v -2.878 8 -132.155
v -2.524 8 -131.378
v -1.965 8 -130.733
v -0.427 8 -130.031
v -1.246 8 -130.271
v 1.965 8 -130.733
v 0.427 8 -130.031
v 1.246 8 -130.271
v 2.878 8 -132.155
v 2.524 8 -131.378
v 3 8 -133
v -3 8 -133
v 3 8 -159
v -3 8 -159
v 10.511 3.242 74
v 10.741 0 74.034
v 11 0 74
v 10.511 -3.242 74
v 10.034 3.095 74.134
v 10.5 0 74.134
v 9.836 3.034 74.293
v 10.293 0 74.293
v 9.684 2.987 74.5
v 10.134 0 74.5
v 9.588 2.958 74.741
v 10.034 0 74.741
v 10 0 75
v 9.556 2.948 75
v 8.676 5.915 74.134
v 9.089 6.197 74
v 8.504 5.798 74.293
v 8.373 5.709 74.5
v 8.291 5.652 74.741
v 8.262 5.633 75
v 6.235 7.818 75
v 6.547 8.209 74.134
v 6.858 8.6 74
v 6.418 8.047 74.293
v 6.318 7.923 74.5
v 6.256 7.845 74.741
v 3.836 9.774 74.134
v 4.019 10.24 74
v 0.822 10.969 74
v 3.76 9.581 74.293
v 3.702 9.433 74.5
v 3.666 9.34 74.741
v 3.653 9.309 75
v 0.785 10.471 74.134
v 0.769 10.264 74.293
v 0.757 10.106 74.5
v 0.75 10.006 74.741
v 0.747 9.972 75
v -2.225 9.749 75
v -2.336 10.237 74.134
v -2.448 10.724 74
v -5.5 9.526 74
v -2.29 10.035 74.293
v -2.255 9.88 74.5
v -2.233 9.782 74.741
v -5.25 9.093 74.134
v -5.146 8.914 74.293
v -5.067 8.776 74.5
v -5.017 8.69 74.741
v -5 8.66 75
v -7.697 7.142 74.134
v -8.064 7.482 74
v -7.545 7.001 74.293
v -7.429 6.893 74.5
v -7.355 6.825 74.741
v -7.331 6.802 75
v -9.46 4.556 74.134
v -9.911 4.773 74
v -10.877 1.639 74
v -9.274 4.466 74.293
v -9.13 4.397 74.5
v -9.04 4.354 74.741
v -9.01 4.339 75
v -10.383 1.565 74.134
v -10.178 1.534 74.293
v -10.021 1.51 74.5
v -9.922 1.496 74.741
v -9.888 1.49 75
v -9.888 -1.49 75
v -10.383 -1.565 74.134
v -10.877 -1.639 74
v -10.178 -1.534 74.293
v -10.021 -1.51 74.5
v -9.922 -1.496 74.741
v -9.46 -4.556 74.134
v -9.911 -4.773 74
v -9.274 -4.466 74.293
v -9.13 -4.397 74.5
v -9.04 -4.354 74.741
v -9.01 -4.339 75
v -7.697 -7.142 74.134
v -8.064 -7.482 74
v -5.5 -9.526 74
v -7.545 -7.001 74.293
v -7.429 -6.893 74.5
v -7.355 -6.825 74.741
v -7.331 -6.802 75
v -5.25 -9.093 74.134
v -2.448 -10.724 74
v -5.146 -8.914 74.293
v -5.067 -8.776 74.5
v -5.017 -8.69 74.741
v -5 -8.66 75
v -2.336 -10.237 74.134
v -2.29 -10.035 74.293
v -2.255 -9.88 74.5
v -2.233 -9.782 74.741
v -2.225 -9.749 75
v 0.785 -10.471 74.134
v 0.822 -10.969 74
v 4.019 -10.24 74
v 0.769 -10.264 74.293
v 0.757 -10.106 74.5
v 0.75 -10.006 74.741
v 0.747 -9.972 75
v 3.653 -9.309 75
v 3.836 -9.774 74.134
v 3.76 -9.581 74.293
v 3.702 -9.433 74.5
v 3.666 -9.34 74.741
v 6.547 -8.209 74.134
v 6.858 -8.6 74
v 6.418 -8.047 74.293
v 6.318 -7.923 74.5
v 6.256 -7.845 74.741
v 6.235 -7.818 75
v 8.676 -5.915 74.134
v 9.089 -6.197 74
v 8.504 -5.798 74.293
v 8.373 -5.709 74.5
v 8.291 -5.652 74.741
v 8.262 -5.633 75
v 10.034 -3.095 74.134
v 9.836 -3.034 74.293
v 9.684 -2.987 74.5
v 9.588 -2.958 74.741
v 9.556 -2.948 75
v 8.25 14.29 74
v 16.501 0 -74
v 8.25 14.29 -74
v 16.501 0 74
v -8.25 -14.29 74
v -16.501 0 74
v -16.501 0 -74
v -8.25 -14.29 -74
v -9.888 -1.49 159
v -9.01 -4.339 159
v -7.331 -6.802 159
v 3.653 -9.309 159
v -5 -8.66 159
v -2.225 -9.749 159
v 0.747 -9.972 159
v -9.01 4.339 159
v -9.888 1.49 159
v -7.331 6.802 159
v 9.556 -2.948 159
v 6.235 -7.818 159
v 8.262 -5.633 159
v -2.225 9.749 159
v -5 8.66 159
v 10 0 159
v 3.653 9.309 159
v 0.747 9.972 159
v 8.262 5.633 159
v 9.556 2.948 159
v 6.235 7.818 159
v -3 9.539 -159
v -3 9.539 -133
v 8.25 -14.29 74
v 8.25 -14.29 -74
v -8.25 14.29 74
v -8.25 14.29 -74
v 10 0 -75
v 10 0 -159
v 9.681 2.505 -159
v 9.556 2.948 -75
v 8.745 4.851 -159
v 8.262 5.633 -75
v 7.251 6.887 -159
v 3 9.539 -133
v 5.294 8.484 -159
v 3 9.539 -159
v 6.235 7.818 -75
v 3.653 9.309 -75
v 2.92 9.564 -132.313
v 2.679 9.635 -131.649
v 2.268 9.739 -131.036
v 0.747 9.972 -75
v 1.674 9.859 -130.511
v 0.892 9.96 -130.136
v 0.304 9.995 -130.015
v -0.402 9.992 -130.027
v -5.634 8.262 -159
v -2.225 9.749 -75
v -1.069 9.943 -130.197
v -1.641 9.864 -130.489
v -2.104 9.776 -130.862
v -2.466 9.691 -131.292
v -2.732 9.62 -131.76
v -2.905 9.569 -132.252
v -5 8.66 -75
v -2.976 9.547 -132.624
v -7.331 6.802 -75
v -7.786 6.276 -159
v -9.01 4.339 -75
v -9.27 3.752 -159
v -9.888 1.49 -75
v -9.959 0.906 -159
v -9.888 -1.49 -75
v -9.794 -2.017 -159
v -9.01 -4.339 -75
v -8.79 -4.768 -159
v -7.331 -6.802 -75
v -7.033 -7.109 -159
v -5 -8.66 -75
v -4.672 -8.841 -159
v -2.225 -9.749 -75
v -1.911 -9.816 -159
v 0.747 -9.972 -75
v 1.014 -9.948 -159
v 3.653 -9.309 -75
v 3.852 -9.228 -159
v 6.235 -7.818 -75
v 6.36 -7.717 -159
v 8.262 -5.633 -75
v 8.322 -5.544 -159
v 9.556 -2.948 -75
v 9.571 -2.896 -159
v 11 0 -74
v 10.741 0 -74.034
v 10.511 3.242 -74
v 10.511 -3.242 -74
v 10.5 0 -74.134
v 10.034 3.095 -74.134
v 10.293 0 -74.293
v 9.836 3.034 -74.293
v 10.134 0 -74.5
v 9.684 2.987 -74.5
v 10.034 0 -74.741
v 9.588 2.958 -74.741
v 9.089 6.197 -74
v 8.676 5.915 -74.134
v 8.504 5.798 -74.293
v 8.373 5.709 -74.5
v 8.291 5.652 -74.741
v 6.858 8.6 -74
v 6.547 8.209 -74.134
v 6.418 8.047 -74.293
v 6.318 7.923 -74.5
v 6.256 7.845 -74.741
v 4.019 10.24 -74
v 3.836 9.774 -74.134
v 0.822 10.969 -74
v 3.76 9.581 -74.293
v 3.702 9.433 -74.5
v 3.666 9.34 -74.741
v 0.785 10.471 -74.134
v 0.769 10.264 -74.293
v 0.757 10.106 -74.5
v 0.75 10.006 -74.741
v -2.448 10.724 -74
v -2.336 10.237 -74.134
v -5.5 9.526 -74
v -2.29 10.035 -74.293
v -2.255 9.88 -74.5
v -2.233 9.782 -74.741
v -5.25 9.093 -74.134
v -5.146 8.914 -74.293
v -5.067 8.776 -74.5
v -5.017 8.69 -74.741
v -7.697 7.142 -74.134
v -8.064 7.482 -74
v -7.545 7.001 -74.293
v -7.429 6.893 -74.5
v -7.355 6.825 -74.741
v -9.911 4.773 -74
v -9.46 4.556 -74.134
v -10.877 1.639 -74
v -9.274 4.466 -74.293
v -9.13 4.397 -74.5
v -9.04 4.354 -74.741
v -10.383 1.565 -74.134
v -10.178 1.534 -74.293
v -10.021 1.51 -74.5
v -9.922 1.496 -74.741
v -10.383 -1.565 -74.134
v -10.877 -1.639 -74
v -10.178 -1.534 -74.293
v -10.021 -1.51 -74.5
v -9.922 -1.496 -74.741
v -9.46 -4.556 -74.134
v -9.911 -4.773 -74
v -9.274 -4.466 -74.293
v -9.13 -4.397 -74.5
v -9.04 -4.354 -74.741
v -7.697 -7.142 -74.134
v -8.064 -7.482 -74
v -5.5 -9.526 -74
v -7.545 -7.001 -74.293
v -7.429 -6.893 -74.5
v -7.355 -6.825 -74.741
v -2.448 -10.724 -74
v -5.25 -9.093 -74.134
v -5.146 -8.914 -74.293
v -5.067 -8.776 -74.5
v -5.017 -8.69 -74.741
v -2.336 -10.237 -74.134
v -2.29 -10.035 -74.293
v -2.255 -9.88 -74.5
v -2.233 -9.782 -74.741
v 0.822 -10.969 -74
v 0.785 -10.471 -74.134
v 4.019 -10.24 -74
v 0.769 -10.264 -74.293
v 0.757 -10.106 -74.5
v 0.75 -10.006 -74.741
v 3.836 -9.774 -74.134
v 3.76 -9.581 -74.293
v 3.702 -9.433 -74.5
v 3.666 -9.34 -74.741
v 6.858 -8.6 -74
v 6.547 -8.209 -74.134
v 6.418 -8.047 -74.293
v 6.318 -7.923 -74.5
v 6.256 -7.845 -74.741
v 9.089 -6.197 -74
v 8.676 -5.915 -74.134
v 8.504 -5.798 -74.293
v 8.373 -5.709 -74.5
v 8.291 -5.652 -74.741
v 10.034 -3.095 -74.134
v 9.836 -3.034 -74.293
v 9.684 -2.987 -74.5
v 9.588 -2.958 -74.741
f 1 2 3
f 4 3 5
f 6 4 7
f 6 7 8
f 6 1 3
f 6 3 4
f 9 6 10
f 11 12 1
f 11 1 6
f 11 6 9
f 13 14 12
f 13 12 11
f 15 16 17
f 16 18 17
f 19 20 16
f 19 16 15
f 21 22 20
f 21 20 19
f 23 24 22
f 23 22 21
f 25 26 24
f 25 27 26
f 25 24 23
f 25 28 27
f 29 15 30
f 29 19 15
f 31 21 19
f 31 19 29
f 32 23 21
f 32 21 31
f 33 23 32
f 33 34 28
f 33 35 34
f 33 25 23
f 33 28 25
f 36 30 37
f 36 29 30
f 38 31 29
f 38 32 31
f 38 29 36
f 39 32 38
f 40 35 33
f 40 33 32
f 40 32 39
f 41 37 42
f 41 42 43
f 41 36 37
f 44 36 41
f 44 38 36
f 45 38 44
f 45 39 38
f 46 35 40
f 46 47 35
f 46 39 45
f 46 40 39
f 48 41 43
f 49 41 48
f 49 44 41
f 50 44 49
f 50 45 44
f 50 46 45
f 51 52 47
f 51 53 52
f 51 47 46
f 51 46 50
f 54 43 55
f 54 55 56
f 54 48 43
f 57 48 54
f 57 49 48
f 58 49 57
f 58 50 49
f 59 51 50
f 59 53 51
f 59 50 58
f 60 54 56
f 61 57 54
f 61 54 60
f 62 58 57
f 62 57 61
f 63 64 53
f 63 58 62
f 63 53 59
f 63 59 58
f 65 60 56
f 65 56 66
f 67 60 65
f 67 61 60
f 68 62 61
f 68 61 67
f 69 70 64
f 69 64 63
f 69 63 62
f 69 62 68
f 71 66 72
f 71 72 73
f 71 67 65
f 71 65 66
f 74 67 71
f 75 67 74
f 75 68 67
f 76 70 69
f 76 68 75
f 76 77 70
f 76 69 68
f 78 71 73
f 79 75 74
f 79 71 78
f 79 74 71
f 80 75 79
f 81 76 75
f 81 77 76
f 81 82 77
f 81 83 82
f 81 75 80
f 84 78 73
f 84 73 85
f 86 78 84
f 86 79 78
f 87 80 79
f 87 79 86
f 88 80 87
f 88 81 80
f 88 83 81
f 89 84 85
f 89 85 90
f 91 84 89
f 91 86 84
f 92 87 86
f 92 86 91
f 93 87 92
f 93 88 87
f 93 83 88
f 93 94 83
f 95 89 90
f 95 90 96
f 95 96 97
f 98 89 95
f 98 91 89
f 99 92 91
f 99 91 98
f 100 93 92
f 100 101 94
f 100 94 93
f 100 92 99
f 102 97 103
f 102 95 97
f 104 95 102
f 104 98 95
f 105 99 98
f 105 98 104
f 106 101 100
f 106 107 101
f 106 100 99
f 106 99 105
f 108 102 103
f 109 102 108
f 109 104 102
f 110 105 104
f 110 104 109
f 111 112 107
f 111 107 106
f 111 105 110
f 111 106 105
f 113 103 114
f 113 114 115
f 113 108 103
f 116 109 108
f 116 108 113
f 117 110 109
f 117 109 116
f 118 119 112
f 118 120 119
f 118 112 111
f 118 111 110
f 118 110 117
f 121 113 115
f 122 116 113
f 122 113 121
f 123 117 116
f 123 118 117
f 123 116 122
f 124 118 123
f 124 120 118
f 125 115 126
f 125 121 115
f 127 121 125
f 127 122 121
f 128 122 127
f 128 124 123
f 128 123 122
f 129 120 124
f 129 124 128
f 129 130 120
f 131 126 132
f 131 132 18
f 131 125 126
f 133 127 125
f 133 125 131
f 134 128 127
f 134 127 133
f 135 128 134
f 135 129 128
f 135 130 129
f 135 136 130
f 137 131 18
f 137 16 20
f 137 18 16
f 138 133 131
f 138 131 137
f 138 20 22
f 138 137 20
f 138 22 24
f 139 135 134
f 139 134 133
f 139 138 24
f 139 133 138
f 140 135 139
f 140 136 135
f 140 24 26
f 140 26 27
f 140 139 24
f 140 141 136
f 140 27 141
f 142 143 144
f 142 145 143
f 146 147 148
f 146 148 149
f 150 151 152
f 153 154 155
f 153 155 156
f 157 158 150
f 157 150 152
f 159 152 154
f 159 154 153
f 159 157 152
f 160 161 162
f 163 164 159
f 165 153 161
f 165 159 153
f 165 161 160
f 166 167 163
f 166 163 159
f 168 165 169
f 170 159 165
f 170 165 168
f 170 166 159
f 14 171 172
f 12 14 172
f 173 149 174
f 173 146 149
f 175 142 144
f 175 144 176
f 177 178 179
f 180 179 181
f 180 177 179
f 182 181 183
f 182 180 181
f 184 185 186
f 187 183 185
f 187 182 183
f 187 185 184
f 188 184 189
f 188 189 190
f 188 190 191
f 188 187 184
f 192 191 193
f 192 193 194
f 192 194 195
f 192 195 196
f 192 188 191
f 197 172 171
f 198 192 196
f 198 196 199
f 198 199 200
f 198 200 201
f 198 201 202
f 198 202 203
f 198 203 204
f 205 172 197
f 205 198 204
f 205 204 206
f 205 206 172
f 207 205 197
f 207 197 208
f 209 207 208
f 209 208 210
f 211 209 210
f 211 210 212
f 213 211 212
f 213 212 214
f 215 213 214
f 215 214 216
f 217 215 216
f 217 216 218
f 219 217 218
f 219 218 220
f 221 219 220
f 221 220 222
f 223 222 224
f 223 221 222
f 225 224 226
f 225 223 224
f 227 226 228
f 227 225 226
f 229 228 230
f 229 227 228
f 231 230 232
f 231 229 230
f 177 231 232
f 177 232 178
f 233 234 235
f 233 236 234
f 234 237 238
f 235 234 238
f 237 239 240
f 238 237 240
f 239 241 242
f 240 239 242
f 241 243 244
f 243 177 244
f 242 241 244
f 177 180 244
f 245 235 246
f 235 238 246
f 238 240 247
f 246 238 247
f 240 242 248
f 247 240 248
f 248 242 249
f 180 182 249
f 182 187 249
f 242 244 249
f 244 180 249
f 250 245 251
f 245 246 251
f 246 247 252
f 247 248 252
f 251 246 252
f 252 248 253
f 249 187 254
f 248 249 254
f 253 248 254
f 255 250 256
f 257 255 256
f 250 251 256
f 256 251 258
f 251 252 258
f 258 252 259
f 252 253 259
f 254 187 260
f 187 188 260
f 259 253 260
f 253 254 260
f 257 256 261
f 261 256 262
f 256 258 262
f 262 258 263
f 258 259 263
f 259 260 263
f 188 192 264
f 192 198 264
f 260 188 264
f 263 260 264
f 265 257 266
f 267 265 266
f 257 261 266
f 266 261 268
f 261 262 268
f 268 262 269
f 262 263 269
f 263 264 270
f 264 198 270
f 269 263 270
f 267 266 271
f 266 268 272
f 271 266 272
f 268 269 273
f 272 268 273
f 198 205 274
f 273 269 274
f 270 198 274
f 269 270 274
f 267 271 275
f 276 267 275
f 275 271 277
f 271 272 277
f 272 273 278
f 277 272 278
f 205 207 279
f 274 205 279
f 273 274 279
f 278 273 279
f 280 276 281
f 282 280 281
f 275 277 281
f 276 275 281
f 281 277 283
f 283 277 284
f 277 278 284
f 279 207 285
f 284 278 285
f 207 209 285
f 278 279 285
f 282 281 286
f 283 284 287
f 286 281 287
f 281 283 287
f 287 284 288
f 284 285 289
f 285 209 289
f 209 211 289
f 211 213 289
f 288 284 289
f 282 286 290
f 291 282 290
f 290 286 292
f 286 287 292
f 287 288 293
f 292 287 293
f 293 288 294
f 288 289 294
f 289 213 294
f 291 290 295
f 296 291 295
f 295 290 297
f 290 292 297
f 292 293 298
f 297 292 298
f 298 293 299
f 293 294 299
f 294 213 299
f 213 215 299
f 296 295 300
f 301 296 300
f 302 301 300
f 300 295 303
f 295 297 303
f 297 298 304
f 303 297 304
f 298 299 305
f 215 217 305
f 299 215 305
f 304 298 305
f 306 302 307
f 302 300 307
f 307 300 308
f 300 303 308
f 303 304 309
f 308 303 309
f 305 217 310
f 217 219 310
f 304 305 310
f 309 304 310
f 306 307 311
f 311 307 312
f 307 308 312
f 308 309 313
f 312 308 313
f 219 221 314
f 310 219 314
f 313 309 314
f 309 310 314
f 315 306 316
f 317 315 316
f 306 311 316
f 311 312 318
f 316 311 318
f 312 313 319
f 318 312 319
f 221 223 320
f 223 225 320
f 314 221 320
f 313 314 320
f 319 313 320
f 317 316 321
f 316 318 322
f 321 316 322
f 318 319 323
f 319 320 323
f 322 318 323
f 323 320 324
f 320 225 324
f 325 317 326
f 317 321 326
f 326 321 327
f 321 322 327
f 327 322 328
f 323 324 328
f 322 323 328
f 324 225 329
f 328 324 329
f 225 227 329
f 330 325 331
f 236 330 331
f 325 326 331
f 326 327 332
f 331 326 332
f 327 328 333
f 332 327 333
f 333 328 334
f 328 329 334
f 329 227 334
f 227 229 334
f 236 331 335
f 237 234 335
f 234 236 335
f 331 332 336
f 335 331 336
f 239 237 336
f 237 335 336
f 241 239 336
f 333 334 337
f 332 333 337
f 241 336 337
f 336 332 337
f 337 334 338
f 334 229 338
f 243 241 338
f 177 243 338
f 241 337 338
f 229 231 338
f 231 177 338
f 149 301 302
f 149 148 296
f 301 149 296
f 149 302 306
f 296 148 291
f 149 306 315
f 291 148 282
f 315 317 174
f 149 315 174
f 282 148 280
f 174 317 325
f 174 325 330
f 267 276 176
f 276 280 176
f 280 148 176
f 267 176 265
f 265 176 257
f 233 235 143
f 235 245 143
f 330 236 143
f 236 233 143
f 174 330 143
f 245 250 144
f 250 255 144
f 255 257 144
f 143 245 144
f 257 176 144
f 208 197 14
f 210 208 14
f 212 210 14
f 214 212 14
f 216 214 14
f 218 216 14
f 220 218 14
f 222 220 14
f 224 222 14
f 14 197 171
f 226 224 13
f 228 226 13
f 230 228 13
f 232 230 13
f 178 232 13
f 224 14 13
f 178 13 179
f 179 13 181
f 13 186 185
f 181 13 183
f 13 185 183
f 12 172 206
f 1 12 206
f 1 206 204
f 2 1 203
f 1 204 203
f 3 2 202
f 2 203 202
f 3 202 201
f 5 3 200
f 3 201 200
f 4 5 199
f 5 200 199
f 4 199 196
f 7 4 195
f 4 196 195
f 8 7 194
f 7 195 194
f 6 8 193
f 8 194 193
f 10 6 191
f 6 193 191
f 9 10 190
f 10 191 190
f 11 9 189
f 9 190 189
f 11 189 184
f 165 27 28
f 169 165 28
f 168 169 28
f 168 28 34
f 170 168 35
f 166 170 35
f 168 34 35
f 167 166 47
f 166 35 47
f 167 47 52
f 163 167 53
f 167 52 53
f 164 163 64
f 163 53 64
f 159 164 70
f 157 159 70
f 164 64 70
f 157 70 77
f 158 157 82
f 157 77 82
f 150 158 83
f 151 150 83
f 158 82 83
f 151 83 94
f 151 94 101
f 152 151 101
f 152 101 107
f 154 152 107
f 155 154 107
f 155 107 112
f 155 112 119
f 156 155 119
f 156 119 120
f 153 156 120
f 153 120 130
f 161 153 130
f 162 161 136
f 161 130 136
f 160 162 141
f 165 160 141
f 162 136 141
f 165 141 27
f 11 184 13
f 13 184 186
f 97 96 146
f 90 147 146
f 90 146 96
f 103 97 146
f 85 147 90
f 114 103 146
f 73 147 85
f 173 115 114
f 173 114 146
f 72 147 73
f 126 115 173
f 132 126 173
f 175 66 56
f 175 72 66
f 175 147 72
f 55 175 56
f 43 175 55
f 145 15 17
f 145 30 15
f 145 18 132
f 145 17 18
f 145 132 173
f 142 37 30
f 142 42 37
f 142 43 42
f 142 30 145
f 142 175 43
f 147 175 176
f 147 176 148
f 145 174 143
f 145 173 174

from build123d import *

# Parameters (mm, degrees)
BOSS_EXTRUDE1_DEPTH = 74
SKETCH2_R           = 10
BOSS_EXTRUDE2_DEPTH = 85
FILLET1_R           = 1
CUT_EXTRUDE1_DEPTH  = 2


with BuildPart() as part:
    # Sketch1 → Boss-Extrude1 (new, symmetric)
    with BuildSketch(Plane.XY):
        Polygon((16.500670693, 0), (8.250335347, 14.29), (-8.250335347, 14.29), (-16.500670693, 0), (-8.250335347, -14.29), (8.250335347, -14.29), align=None)
    extrude(amount=BOSS_EXTRUDE1_DEPTH, both=True)

    # Sketch2 → Boss-Extrude2 (add)
    with BuildSketch(Plane.XY.offset(74)):
        Circle(SKETCH2_R)
    boss_extrude2 = extrude(amount=BOSS_EXTRUDE2_DEPTH)

    # Mirror3: Boss-Extrude2 across plane
    add(boss_extrude2.mirror(Plane.XY))

    # Fillet1
    fillet1_edges = [part.edges().sort_by_distance(p)[0] for p in [
        (-10, 0, 74),
        (-10, 0, -74),
    ]]
    fillet(fillet1_edges, radius=FILLET1_R)

    # Sketch3 → Cut-Extrude1 (cut)
    with BuildSketch(Plane(origin=(0, 10, 0), x_dir=(1, 0, 0), z_dir=(0, 1, 0))):
        with BuildLine():
            Line((3, 133), (3, 159))
            Line((3, 159), (-3, 159))
            Line((-3, 159), (-3, 133))
            ThreePointArc((-3, 133), (0, 130), (3, 133))
        make_face()
    extrude(amount=-CUT_EXTRUDE1_DEPTH, mode=Mode.SUBTRACT)


solid = part.part
